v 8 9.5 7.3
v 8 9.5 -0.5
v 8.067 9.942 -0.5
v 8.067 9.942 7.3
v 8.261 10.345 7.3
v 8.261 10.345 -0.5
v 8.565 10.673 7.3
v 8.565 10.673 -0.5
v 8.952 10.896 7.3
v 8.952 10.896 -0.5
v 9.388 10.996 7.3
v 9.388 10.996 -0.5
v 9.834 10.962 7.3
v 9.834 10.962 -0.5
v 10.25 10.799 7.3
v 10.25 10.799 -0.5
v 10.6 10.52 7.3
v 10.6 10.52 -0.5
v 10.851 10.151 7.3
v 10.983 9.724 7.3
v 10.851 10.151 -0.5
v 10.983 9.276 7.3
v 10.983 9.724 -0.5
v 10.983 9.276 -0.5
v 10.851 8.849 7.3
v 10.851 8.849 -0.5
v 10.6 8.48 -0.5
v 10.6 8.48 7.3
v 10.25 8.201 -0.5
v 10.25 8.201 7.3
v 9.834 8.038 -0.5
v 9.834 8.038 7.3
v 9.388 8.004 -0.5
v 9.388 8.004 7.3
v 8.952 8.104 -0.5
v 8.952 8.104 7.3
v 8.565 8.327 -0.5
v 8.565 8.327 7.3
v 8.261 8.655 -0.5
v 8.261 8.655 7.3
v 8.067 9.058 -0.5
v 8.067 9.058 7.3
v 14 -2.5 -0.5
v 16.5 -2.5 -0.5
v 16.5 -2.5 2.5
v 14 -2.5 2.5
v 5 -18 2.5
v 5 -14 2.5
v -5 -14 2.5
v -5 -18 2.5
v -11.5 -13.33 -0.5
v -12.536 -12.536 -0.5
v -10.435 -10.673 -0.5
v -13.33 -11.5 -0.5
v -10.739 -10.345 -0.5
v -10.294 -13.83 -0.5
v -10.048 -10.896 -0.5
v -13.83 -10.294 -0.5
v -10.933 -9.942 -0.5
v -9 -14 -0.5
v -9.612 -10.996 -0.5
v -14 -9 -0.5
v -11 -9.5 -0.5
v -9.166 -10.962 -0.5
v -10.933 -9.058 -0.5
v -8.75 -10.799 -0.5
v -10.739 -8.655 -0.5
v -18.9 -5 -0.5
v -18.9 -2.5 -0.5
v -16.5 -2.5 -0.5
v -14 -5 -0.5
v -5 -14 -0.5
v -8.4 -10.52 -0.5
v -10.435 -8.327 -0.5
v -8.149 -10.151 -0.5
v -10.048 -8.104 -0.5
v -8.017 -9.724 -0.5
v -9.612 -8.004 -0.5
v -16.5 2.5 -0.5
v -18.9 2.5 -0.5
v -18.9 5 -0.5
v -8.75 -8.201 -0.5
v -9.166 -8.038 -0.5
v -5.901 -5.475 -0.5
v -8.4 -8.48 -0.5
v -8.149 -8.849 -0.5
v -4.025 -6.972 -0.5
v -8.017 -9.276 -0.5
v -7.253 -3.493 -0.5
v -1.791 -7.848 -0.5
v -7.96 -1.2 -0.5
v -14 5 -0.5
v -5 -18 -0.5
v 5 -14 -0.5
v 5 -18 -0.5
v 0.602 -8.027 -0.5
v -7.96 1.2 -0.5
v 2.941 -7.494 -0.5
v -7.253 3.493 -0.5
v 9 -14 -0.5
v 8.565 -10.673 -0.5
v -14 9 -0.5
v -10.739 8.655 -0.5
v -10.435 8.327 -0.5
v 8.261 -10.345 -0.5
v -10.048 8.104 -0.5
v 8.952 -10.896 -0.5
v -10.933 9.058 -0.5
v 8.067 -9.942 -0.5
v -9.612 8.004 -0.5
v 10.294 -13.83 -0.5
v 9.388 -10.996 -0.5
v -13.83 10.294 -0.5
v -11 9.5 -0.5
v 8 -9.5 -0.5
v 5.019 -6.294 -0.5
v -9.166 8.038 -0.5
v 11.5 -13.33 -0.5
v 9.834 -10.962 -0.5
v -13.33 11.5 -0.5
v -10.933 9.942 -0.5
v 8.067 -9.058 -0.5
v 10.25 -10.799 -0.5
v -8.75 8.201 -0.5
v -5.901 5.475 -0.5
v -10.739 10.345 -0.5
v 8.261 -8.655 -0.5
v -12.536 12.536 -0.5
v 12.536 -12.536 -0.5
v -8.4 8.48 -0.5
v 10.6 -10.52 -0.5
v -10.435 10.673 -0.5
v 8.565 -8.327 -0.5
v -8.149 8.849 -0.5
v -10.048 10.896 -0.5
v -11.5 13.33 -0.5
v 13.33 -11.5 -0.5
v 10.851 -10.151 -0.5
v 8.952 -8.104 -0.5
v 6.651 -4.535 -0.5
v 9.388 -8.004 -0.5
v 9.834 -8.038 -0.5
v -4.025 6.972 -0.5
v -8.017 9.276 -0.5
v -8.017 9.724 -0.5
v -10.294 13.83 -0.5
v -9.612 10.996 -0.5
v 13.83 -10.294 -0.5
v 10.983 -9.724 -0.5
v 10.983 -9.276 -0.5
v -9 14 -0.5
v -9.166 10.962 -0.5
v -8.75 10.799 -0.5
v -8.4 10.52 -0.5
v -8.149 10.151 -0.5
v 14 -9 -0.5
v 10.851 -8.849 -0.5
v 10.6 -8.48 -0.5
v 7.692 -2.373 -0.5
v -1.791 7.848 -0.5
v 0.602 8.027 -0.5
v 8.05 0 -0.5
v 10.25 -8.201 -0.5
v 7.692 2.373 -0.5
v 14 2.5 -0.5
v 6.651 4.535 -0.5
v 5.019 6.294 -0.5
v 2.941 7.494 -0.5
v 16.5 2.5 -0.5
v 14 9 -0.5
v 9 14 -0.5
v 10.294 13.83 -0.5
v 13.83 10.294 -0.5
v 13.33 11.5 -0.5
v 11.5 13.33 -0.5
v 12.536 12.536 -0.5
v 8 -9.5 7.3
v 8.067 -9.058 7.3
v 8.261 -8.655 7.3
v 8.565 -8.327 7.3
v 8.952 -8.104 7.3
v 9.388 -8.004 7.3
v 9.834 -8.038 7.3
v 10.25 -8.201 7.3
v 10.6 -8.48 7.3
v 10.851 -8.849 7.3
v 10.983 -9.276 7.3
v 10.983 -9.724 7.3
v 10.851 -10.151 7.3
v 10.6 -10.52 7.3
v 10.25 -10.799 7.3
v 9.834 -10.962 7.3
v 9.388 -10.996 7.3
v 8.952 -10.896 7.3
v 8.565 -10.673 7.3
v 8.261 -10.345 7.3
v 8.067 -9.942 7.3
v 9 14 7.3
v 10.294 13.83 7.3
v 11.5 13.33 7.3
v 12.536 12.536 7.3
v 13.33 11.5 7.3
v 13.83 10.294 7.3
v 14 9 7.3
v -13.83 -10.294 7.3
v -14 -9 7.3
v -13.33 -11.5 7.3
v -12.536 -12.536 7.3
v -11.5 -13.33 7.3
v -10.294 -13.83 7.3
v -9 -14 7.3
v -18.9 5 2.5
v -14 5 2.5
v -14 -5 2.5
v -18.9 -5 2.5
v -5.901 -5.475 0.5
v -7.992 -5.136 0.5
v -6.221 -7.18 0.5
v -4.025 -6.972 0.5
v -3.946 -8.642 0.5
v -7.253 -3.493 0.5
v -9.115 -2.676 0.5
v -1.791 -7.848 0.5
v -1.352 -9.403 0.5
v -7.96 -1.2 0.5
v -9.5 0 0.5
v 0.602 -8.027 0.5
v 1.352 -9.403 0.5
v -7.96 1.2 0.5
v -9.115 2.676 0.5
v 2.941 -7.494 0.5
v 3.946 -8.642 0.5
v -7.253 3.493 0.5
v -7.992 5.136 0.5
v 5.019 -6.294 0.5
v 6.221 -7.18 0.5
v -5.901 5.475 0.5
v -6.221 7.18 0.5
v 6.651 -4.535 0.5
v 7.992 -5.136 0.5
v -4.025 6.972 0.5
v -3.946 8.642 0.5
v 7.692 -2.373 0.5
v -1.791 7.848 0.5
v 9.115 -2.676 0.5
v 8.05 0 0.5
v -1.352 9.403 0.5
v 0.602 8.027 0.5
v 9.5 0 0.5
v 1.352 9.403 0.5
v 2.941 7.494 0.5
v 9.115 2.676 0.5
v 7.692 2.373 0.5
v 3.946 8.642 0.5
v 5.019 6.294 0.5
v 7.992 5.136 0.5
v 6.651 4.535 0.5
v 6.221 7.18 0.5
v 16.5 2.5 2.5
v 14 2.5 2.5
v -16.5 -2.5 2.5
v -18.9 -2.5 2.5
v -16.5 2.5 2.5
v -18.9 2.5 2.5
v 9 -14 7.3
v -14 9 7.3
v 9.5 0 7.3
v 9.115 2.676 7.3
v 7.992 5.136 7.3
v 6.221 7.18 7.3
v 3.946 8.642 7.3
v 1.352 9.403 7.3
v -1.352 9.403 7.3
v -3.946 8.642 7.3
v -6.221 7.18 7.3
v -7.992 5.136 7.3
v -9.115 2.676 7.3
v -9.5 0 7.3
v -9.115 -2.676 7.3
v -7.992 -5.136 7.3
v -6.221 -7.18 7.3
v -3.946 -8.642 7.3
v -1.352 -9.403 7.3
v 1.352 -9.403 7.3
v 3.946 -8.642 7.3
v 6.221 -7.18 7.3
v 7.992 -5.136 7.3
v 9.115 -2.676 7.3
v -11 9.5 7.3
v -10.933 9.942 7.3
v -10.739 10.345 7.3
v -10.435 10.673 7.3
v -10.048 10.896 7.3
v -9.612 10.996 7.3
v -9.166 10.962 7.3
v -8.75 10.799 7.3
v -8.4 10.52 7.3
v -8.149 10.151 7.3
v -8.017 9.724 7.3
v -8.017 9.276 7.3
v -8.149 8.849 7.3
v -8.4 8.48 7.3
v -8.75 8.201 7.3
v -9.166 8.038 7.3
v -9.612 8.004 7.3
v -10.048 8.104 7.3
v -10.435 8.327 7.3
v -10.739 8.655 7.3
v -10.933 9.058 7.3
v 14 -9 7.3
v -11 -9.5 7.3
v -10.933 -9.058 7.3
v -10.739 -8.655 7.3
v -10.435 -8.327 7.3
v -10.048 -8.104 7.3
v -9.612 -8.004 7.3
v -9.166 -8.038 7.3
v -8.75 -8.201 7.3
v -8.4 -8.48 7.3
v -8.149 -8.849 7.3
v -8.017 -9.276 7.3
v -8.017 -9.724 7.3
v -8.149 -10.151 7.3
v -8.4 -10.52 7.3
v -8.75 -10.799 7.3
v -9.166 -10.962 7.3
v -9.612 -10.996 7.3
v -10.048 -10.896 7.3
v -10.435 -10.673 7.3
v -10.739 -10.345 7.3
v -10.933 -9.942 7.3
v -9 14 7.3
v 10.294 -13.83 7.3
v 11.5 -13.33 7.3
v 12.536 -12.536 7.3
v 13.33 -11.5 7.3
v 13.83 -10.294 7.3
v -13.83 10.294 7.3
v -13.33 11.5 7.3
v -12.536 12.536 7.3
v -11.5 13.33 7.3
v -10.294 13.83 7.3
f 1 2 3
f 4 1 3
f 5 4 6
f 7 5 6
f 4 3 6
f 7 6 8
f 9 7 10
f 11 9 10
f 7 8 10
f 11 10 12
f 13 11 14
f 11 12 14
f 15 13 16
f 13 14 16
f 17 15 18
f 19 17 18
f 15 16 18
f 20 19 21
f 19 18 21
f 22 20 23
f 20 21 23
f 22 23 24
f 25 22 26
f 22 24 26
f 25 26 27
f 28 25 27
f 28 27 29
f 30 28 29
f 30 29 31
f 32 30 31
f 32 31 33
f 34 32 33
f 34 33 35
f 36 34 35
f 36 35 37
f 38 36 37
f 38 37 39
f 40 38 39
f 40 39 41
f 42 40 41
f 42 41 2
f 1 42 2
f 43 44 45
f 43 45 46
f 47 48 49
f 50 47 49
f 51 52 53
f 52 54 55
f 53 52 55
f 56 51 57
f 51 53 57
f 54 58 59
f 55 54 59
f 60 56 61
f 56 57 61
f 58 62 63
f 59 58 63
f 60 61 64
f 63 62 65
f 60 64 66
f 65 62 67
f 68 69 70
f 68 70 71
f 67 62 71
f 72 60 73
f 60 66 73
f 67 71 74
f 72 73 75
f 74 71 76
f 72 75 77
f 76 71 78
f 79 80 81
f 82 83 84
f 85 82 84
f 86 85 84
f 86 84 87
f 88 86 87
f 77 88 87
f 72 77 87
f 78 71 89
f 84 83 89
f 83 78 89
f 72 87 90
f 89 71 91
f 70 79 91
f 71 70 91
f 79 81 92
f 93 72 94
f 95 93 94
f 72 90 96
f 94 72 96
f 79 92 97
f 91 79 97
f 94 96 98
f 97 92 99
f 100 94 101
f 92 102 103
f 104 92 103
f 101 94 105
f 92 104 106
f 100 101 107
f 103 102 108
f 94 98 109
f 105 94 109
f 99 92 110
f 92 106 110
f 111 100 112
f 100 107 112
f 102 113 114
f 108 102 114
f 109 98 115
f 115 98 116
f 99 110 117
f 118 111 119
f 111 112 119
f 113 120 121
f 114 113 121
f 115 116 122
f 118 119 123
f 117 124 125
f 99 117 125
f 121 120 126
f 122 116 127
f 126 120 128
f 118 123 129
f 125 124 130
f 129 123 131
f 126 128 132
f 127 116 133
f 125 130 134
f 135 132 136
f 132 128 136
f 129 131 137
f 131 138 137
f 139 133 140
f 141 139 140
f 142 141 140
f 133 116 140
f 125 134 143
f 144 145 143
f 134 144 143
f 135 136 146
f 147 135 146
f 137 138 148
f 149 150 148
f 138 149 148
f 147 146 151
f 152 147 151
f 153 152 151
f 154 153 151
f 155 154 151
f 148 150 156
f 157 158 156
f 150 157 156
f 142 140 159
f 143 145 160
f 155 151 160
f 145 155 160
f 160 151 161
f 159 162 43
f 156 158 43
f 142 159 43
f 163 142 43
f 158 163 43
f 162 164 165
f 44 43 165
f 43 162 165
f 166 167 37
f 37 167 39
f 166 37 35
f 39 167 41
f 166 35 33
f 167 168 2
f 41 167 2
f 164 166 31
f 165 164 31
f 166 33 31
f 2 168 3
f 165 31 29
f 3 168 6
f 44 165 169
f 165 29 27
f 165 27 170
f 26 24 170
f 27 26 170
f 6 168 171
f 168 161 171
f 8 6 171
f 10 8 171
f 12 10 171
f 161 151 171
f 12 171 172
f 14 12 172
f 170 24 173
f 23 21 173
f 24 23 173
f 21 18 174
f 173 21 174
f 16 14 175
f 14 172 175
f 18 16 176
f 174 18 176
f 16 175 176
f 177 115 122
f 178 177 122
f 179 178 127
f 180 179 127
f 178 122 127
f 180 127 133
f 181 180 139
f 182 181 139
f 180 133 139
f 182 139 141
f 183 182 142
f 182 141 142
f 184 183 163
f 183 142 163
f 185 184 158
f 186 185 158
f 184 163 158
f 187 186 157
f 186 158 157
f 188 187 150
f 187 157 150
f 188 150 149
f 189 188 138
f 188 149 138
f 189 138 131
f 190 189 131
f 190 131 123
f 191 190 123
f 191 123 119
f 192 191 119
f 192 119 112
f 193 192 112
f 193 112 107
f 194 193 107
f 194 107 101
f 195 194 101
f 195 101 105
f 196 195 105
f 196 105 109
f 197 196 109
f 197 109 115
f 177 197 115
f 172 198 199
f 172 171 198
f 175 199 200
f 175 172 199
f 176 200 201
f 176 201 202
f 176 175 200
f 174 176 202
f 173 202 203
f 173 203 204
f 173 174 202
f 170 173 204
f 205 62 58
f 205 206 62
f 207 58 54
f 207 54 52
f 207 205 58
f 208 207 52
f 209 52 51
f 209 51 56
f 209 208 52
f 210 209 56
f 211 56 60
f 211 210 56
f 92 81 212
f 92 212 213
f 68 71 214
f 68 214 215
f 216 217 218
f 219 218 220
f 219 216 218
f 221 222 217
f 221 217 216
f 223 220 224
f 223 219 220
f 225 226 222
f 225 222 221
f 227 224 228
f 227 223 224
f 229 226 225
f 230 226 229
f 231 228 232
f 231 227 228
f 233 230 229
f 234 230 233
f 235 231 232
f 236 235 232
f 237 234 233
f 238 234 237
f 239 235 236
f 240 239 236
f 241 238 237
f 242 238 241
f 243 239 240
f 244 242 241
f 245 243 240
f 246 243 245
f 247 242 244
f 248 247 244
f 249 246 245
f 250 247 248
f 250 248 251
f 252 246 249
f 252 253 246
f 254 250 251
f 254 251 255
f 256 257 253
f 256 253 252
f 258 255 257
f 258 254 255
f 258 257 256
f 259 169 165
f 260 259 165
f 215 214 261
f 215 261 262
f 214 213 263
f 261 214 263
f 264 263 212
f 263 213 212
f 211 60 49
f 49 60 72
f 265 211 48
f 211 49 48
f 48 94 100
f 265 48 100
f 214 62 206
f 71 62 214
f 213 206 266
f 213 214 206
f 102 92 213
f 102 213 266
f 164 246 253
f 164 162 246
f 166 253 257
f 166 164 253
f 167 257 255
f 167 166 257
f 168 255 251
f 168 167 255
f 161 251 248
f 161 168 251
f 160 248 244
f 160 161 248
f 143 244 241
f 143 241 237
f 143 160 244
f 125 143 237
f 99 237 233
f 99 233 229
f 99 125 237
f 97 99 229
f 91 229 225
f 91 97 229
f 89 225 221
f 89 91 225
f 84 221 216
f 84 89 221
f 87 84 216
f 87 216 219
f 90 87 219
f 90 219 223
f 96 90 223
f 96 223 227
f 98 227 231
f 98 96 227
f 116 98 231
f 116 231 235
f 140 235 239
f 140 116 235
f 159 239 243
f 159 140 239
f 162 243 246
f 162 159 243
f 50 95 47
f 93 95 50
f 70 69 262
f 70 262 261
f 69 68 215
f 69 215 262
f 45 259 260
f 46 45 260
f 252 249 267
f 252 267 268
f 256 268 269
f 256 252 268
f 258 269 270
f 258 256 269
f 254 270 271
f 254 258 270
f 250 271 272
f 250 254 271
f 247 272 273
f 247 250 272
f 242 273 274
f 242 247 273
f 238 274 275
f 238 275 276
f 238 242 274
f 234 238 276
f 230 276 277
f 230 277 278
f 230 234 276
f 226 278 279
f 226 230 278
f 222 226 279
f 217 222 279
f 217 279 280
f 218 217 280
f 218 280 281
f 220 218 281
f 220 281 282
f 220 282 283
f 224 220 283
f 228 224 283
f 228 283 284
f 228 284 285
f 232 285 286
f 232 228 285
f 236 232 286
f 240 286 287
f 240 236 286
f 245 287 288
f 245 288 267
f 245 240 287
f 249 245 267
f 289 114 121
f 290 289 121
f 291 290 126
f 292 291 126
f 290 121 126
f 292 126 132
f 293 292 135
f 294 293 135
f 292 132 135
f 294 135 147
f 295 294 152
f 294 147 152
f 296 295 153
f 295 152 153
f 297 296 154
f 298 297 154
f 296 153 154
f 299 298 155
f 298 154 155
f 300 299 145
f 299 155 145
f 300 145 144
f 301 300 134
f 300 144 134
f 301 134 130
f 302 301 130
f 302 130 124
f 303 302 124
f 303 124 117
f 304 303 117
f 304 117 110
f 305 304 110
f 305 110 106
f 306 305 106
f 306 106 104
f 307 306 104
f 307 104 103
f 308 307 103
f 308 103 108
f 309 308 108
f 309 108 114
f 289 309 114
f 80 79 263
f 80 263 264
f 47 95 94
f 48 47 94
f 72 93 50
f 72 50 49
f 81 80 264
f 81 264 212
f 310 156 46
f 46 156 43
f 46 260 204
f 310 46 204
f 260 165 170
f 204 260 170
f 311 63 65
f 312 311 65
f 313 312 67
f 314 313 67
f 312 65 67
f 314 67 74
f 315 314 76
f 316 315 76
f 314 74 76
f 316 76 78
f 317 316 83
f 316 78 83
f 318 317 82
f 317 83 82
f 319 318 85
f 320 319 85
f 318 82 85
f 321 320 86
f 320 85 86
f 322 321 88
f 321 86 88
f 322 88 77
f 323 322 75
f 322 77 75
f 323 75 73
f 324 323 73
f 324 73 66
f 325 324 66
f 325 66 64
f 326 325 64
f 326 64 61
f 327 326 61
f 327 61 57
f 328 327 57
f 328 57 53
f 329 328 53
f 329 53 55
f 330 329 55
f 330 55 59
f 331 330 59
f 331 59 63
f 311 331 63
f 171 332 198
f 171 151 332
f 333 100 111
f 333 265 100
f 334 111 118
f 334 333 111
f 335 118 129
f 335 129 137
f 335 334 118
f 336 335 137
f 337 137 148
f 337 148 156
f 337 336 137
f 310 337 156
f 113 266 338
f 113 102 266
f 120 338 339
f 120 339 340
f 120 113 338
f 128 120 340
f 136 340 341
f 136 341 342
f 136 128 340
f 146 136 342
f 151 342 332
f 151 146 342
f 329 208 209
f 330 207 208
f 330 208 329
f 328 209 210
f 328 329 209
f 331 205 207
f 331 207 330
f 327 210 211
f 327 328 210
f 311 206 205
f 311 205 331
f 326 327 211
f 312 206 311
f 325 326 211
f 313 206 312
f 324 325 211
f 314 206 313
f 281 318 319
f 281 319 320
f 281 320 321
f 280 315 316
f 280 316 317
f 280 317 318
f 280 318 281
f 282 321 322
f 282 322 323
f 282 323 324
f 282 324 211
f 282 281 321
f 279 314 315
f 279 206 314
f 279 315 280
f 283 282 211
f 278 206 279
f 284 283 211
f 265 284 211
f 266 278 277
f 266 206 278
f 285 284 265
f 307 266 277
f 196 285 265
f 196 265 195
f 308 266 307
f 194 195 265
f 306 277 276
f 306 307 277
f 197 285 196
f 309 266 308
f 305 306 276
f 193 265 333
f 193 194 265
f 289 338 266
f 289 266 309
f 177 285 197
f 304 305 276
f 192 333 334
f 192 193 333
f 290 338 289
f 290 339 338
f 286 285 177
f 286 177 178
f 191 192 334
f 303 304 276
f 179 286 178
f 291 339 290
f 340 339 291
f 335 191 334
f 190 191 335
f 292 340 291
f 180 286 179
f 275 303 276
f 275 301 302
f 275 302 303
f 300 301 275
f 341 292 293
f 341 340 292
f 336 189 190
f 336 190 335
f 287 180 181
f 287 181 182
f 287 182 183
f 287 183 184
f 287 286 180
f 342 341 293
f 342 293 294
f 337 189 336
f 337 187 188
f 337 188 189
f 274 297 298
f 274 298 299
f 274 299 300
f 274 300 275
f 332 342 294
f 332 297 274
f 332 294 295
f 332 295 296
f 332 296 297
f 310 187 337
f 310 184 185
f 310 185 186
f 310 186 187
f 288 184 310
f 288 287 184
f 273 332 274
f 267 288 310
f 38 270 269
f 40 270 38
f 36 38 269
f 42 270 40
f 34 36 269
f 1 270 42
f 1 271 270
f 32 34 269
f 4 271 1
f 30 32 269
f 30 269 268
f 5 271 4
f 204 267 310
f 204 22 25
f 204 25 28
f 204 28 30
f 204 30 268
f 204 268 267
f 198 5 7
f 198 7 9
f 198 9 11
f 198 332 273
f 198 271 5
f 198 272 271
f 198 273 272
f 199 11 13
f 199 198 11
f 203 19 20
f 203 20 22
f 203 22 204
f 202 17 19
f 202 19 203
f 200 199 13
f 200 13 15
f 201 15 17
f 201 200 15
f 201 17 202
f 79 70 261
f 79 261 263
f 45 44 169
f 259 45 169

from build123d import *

# Parameters (mm, degrees)
CROQUIS1_W              = 28
CROQUIS1_H              = 28
CROQUIS1_R              = 8.05
SALIENTE_EXTRUIR1_DEPTH = 0.5
CROQUIS2_W              = 28
CROQUIS2_H              = 28
CROQUIS2_R              = 9.5
SALIENTE_EXTRUIR2_DEPTH = 6.8
CROQUIS7_W              = 2.5
CROQUIS7_H              = 5
CROQUIS7_W_2            = 10
CROQUIS7_H_2            = 4
SALIENTE_EXTRUIR3_DEPTH = 3
REDONDEO1_R             = 5
CROQUIS6_R              = 1.5
CORTAR_EXTRUIR3_DEPTH   = 10


with BuildPart() as part:
    # Croquis1 → Saliente-Extruir1 (new, symmetric)
    with BuildSketch(Plane.XY):
        Rectangle(CROQUIS1_W, CROQUIS1_H)
        Circle(CROQUIS1_R, mode=Mode.SUBTRACT)
    extrude(amount=SALIENTE_EXTRUIR1_DEPTH, both=True)

    # Croquis2 → Saliente-Extruir2 (add)
    with BuildSketch(Plane.XY.offset(0.5)):
        Rectangle(CROQUIS2_W, CROQUIS2_H)
        Circle(CROQUIS2_R, mode=Mode.SUBTRACT)
    extrude(amount=SALIENTE_EXTRUIR2_DEPTH)

    # Croquis7 → Saliente-Extruir3 (add)
    with BuildSketch(Plane(origin=(0, 0, -0.5), x_dir=(-1, 0, 0), z_dir=(0, 0, -1))):
        with Locations((-15.25, 0)):
            Rectangle(CROQUIS7_W, CROQUIS7_H)
        with Locations((0, -16)):
            Rectangle(CROQUIS7_W_2, CROQUIS7_H_2)
        Polygon((14, -2.5), (14, -5), (18.9, -5), (18.9, -2.5), (16.5, -2.5), align=None)
        with Locations((15.25, 0)):
            Rectangle(CROQUIS7_W, CROQUIS7_H)
        Polygon((14, 5), (14, 2.5), (16.5, 2.5), (18.9, 2.5), (18.9, 5), align=None)
    extrude(amount=-SALIENTE_EXTRUIR3_DEPTH)

    # Redondeo1
    redondeo1_edges = [part.edges().sort_by_distance(p)[0] for p in [
        (14, -14, 3.4),
        (-14, -14, 3.4),
        (-14, 14, 3.4),
        (14, 14, 3.4),
    ]]
    fillet(redondeo1_edges, radius=REDONDEO1_R)

    # Croquis6 → Cortar-Extruir3 (cut)
    with BuildSketch(Plane(origin=(0, 0, -0.5), x_dir=(-1, 0, 0), z_dir=(0, 0, -1))):
        with Locations((-9.5, 9.5)):
            Circle(CROQUIS6_R)
        with Locations((9.5, 9.5)):
            Circle(CROQUIS6_R)
        with Locations((9.5, -9.5)):
            Circle(CROQUIS6_R)
        with Locations((-9.5, -9.5)):
            Circle(CROQUIS6_R)
    extrude(amount=-CORTAR_EXTRUIR3_DEPTH, mode=Mode.SUBTRACT)


solid = part.part
